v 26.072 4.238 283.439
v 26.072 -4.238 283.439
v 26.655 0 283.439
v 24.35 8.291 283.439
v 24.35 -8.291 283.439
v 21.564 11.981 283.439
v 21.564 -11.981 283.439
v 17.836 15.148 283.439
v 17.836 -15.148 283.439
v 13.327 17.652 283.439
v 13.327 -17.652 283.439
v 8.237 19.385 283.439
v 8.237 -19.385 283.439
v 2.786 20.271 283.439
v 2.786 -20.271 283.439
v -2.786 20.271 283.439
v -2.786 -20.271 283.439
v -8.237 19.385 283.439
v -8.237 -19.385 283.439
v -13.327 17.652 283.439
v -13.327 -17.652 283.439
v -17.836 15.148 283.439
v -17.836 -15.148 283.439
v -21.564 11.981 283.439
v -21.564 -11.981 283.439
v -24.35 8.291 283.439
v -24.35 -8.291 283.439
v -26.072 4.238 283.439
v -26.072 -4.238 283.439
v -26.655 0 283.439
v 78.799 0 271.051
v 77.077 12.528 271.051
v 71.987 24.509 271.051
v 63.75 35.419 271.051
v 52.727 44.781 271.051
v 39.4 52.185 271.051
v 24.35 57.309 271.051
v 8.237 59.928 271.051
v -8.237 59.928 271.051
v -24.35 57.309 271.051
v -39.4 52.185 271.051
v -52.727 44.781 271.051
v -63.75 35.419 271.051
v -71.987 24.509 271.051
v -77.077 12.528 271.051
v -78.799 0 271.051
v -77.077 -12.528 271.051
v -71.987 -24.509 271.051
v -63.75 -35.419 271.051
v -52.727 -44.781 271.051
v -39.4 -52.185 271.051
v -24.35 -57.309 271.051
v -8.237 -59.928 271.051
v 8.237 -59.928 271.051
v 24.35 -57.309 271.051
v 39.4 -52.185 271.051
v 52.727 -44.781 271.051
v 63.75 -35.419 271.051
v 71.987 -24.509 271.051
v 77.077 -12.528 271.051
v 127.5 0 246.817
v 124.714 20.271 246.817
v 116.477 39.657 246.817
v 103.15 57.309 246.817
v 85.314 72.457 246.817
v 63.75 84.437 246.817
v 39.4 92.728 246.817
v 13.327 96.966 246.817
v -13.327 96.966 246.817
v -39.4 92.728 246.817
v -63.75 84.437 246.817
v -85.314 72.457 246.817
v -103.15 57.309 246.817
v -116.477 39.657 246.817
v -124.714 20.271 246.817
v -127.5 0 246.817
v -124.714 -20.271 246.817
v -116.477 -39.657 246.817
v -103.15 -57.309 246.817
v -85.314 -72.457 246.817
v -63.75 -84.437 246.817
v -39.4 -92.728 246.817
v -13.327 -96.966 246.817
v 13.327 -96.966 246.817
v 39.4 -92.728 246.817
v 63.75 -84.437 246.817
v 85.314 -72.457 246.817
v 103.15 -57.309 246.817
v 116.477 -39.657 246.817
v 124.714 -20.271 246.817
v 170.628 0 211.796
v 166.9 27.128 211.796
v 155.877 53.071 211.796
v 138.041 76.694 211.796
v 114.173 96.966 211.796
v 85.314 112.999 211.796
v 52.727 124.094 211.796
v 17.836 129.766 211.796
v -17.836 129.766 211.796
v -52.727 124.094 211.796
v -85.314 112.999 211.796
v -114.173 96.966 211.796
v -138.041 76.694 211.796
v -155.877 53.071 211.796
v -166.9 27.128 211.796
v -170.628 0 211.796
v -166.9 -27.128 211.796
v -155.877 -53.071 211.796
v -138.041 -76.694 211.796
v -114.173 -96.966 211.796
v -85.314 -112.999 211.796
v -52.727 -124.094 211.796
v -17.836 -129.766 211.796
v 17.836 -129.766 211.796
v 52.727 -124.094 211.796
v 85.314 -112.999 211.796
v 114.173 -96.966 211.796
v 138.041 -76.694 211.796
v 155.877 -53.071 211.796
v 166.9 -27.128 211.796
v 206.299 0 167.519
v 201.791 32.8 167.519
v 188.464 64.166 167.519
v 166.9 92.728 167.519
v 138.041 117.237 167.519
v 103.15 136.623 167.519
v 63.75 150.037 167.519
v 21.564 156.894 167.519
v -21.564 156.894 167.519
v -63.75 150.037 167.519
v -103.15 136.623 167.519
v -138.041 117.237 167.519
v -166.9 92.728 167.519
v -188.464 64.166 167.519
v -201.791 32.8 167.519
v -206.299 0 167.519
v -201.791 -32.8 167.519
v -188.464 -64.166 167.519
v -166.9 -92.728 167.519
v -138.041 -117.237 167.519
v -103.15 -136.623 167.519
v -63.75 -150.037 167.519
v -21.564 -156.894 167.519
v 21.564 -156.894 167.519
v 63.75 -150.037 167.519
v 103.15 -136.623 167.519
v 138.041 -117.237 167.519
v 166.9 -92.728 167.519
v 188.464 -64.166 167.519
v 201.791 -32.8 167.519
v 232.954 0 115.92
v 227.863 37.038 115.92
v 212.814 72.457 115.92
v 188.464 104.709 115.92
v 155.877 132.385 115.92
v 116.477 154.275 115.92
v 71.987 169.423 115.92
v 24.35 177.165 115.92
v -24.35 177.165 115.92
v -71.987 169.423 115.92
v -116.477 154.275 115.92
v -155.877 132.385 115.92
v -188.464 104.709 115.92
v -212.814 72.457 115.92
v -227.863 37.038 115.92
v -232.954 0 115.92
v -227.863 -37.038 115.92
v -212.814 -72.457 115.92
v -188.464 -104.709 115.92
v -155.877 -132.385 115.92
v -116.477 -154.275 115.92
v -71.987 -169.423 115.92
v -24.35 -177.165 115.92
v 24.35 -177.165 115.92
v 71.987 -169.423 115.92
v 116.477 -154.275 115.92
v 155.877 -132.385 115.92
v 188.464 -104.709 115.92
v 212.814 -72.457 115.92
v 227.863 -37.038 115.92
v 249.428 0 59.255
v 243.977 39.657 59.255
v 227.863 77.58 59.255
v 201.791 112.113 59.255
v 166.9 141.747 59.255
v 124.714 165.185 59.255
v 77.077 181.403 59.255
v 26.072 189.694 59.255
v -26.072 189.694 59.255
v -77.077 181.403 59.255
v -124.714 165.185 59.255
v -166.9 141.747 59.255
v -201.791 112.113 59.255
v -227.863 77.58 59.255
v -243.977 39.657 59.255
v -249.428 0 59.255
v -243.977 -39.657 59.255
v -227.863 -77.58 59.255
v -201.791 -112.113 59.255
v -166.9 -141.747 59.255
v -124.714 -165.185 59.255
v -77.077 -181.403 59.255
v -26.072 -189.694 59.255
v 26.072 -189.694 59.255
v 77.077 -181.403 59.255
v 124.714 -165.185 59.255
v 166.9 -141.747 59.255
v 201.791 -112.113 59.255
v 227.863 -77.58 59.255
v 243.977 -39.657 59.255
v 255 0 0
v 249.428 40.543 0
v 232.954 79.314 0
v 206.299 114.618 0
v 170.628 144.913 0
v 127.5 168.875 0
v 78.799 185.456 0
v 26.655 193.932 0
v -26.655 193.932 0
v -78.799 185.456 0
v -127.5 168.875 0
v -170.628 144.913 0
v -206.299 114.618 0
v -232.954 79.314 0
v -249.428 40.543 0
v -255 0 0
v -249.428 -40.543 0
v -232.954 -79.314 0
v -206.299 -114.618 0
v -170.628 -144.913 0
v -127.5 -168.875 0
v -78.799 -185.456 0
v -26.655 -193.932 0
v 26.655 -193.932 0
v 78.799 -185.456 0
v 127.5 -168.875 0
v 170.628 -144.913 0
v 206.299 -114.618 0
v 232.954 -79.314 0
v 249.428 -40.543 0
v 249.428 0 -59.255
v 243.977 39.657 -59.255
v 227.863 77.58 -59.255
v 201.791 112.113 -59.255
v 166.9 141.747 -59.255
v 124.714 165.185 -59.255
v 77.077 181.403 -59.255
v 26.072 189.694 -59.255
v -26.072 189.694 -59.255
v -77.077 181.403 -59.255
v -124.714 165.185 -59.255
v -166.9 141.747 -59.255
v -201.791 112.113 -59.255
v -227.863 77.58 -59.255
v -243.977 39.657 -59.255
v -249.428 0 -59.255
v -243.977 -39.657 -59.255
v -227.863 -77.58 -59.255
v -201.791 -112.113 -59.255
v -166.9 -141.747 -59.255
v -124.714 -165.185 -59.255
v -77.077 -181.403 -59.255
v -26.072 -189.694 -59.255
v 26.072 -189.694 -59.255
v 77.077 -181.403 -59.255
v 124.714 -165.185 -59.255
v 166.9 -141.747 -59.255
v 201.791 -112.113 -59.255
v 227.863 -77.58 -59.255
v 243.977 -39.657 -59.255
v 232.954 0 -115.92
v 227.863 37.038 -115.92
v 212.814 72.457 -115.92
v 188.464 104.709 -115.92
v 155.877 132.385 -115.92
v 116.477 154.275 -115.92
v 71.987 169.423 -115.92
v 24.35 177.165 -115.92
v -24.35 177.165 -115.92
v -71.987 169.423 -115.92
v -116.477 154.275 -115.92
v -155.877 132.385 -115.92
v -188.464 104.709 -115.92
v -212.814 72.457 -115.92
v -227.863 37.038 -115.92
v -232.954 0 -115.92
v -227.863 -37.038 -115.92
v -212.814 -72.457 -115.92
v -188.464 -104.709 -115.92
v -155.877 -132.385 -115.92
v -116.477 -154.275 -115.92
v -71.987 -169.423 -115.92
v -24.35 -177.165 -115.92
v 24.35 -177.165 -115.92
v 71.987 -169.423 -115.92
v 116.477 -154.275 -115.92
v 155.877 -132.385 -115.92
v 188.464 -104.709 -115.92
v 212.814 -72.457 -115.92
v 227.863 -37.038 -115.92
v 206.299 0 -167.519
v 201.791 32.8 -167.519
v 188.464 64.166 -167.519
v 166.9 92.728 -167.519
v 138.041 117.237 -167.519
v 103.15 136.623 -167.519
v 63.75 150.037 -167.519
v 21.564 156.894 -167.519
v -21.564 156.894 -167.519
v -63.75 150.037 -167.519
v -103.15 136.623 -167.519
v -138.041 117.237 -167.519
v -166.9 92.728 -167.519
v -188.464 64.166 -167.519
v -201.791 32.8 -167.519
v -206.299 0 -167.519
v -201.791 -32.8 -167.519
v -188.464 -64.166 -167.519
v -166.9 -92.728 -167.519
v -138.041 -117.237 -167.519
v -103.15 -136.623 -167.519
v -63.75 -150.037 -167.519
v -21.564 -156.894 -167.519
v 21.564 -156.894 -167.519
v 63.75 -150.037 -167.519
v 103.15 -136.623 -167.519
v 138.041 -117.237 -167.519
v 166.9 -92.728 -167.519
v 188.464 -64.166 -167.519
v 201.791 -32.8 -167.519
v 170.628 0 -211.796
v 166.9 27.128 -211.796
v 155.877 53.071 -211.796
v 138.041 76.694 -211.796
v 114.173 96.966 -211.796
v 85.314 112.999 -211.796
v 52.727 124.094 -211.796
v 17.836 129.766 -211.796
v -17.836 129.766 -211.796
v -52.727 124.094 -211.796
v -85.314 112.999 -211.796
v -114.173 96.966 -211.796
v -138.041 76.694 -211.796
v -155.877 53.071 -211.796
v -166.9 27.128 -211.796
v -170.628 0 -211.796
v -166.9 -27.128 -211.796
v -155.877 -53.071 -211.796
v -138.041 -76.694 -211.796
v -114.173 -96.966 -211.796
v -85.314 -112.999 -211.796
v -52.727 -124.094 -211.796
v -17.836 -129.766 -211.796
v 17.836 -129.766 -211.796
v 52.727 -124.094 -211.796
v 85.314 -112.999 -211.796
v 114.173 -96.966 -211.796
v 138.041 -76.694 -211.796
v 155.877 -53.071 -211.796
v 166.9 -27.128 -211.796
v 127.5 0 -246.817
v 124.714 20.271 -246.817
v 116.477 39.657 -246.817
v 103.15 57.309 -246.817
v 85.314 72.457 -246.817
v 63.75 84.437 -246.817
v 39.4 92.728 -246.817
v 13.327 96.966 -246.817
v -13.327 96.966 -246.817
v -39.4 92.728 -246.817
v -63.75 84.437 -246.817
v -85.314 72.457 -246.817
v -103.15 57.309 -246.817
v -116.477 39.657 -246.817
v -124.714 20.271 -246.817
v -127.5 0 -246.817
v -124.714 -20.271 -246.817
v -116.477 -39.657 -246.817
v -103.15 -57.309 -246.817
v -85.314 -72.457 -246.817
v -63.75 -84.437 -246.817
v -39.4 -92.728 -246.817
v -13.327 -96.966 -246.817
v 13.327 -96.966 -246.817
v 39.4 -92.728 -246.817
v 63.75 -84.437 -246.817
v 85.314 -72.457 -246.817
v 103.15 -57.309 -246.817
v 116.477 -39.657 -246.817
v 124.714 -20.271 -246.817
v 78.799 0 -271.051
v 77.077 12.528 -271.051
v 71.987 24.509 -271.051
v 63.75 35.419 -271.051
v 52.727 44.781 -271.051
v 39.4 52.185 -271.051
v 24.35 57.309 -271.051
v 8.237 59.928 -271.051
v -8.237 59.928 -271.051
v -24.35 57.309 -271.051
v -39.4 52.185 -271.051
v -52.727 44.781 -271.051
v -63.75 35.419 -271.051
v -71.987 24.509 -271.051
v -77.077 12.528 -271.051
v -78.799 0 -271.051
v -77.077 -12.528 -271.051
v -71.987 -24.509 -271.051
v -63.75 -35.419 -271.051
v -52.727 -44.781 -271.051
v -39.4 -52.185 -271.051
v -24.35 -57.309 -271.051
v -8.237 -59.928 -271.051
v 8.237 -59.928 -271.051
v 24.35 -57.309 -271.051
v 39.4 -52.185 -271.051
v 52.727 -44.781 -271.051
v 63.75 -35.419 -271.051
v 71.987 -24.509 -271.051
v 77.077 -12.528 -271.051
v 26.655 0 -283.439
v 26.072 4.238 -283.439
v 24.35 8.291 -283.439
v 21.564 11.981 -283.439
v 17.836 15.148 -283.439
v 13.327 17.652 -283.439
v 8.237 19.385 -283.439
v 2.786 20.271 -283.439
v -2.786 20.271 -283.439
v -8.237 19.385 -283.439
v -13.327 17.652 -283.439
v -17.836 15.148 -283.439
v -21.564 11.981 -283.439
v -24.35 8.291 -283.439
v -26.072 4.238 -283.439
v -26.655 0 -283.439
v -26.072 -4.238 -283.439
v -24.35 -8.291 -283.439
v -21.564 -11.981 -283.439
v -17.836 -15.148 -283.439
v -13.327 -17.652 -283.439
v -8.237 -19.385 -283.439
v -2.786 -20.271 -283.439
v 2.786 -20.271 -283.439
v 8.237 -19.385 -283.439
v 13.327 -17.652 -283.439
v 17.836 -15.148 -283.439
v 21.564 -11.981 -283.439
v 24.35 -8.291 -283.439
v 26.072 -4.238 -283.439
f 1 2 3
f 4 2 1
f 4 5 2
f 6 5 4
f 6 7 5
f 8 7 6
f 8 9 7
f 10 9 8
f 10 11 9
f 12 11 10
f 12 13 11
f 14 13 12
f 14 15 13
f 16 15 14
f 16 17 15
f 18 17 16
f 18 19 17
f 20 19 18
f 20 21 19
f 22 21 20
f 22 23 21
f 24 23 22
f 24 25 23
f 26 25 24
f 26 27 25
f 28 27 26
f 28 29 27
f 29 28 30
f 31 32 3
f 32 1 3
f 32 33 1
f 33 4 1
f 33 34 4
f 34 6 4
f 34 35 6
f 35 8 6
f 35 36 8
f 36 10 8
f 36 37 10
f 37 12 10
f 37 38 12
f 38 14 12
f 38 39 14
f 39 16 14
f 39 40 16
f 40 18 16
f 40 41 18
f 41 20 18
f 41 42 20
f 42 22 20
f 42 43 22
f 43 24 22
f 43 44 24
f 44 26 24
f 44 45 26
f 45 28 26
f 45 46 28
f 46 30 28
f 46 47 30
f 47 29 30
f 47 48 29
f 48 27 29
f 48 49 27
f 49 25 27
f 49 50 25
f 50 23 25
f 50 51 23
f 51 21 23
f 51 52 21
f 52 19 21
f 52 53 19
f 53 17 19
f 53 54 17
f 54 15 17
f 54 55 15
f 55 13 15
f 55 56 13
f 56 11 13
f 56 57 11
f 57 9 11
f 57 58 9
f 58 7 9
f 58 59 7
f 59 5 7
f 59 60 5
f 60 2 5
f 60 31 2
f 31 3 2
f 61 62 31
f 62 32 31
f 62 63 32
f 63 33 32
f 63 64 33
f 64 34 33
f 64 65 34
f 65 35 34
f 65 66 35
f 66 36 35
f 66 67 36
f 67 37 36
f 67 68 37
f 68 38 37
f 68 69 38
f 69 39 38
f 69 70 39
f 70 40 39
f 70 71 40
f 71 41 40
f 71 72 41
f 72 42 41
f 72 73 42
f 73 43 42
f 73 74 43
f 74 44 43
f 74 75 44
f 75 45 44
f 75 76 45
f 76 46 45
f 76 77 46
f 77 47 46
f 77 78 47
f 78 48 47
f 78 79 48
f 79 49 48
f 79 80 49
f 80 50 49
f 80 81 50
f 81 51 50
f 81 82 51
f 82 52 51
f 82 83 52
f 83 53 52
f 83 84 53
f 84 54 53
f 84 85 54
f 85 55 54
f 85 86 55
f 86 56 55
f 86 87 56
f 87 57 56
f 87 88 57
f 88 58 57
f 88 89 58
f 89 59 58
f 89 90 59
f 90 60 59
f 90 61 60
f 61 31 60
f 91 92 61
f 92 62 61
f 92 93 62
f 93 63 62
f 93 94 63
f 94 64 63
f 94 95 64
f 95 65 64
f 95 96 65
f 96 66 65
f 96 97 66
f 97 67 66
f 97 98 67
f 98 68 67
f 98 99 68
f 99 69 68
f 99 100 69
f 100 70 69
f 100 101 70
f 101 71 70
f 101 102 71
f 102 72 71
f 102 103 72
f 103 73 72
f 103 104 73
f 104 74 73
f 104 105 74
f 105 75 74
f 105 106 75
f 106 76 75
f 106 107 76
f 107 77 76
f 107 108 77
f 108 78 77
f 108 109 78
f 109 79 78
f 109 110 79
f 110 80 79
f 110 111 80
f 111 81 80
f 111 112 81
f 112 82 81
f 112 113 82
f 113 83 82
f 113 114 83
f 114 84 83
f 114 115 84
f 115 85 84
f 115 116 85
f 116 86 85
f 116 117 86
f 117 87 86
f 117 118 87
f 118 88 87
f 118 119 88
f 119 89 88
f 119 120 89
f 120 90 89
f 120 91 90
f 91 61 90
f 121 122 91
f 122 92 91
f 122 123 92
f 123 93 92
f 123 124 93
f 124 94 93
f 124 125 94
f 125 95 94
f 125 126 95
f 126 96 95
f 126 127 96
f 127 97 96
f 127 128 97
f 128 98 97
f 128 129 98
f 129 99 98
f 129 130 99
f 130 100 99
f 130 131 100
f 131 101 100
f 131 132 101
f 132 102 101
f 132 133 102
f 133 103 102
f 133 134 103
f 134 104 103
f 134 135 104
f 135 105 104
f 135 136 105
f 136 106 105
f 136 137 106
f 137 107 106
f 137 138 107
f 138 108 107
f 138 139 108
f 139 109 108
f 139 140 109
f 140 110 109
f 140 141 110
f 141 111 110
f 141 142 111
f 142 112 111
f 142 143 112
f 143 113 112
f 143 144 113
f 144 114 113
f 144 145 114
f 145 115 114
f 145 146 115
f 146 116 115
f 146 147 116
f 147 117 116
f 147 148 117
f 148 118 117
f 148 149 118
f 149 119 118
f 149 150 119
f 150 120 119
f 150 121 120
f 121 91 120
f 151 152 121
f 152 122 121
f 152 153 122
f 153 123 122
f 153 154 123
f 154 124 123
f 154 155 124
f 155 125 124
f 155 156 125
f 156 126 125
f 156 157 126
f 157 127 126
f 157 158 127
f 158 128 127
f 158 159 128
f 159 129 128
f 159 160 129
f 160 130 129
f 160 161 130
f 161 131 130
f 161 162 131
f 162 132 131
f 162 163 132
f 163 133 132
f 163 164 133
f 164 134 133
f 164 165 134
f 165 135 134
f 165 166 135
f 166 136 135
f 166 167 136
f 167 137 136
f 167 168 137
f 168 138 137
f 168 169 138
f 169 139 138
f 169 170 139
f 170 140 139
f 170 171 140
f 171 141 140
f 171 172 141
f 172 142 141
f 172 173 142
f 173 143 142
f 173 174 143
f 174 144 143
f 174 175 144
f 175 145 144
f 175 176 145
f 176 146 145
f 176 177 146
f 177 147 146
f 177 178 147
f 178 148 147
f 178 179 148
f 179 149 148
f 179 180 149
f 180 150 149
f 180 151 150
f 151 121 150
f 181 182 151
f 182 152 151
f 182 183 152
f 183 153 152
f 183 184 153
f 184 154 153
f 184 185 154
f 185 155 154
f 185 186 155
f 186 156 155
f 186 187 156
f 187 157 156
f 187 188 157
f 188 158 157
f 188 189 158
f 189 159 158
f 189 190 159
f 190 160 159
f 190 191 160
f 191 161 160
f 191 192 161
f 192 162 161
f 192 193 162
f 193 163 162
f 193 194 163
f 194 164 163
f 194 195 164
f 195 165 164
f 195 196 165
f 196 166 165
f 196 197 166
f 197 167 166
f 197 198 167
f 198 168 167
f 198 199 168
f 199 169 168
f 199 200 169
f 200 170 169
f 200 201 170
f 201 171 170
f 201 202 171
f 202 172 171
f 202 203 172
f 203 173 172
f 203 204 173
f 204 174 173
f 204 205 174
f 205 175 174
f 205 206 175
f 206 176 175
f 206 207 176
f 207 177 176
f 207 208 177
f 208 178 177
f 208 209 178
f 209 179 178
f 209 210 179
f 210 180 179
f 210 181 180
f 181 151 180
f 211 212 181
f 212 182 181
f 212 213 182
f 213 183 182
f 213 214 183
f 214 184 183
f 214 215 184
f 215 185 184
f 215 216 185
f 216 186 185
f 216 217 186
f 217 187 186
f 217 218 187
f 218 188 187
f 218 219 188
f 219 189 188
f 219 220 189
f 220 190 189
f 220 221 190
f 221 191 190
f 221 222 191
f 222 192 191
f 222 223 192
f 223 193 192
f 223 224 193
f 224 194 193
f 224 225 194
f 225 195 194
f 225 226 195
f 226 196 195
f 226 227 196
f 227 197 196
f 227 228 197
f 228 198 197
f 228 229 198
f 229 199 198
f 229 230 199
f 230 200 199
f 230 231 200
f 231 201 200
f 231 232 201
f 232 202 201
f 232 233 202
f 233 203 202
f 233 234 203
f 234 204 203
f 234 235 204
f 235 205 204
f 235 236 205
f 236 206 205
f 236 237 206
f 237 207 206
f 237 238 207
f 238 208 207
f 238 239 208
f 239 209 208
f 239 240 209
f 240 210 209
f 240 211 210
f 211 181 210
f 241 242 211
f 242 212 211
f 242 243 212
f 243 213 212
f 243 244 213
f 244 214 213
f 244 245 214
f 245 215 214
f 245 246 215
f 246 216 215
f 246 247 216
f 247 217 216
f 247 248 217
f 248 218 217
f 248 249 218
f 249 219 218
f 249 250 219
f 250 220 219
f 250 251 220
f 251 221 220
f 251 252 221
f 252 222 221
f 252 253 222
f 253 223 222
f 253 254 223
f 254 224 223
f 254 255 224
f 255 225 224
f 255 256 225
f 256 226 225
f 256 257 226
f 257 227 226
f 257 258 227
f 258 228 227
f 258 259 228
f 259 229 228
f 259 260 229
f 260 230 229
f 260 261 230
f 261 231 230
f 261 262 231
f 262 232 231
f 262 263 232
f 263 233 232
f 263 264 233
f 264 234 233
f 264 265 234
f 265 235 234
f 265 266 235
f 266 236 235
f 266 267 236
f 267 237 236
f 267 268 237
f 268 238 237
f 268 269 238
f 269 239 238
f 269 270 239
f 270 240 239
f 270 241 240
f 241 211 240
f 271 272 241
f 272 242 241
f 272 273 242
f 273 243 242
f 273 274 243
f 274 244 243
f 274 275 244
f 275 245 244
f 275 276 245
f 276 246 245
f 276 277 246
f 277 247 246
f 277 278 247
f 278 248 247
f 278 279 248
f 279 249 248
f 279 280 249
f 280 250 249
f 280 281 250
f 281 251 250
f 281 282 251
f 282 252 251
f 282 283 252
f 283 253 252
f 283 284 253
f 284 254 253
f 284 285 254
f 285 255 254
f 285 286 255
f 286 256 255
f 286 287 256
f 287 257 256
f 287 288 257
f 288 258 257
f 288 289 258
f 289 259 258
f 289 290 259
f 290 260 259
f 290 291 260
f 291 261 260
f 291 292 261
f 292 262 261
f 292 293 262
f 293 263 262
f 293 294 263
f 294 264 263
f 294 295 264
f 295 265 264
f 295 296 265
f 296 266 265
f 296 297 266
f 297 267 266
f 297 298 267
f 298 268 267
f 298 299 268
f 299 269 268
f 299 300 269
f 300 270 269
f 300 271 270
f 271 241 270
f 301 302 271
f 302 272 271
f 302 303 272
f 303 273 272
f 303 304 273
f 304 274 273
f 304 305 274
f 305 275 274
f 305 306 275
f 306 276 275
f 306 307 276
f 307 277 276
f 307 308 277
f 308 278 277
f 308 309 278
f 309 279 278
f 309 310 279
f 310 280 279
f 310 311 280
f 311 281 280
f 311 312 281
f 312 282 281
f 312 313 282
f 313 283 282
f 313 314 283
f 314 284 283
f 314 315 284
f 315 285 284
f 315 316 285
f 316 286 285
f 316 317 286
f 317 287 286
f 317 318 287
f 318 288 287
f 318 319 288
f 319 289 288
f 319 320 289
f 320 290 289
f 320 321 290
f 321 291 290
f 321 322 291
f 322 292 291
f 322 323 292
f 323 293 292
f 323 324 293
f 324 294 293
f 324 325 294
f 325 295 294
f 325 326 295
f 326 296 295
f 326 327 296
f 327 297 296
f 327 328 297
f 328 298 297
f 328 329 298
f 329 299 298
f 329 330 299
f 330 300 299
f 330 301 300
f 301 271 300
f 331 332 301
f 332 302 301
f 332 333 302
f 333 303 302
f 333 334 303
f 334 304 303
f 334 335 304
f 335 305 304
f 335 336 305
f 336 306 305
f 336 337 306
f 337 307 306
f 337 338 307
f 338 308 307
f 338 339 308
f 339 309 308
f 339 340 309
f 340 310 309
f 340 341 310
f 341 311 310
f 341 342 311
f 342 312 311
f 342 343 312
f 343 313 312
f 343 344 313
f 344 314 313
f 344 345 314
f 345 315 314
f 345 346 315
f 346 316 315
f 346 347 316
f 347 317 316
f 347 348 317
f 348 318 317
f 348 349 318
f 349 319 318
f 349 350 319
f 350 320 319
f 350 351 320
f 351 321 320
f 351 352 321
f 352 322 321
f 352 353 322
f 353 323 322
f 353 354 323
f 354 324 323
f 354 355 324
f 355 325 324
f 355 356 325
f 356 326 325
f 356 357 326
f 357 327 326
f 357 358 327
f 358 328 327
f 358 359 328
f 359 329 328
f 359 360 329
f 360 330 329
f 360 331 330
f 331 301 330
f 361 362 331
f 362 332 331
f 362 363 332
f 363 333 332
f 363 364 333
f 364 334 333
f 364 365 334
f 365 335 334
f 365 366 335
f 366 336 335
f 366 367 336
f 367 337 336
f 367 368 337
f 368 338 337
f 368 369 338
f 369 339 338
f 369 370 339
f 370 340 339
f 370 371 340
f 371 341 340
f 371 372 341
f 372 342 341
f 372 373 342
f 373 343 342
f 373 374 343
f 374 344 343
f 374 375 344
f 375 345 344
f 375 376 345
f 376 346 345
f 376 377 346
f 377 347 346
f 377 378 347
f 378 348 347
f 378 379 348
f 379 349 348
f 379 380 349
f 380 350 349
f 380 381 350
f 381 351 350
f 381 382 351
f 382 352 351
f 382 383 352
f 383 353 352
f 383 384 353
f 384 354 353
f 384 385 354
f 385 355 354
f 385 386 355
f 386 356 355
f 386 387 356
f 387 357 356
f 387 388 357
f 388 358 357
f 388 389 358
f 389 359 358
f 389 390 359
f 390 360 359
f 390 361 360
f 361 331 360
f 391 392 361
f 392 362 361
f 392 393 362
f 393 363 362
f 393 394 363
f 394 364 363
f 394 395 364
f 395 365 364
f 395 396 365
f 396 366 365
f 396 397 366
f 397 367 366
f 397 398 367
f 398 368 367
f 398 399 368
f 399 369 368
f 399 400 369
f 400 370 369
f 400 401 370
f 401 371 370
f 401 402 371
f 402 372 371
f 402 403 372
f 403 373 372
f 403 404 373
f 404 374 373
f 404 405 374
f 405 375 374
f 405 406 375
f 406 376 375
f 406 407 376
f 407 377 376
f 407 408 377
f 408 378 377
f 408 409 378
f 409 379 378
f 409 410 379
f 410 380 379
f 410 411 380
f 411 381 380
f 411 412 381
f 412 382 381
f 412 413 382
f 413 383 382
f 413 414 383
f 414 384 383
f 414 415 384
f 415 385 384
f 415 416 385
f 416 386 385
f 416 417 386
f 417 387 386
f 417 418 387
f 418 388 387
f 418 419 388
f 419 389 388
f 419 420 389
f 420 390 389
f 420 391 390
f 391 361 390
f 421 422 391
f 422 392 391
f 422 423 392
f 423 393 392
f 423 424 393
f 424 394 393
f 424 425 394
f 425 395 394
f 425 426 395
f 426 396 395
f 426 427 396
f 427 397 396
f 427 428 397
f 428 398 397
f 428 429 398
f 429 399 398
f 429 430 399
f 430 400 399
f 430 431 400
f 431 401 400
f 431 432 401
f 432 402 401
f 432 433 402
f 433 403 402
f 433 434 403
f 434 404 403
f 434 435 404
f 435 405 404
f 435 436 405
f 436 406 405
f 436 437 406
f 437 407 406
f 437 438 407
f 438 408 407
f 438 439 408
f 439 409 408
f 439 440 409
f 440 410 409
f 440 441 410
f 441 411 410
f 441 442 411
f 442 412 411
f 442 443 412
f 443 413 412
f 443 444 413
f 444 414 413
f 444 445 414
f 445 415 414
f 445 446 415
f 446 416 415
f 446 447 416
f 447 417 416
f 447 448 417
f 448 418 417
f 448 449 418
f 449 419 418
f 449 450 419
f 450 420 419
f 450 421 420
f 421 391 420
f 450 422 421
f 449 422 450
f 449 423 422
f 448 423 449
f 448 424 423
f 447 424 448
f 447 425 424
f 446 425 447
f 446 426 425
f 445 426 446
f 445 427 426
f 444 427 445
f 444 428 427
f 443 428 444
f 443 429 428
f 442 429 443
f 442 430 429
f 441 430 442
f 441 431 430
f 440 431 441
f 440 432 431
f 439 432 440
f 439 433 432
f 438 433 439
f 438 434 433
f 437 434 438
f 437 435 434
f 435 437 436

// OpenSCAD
// Generated by SolidPython 1.0.1 on 2020-07-29 00:46:53


scale(v = [17, 13, 19]) {
	sphere(r = 15);
}
/***********************************************
*********      SolidPython code:      **********
************************************************
 
# import packages: SolidPython
from solid import *
from solid.utils import *
from itertools import chain, combinations, permutations


class Resize:

    def __init__(self, scad_file):
        self.scad_file = scad_file
        #self.scad_file = import_scad(scad_file)
        # cone/cylinder param:
        self.r1 = 0
        self.r2 = 0
        self.h = 0
        # rectangular prism param:
        self.w = 0
        self.l = 0
        # ellipse param:
        self.r = 0

    # import OpenScad code (file name corresponds to shape)


    # classify shape + parameters
    def assign(self, param1, param2, param3):
        if self.scad_file == 'cone.scad':
            self.r1 = param1
            self.r2 = param2
            self.h = param3
        elif self.scad_file == 'cylinder.scad':
            self.r1 = param1
            self.r2 = param2
            self.h = param3
        elif self.scad_file == 'rectangularPrism.scad':
            self.h = param1
            self.l = param2
            self.w = param3
        else:
            self.r = param1
            self.h = param2

    # resize parameters
    def iterate(self):
        x = range(3, 20, 2)
        i = 1
        if self.scad_file == 'cone.scad':
            tempList = list(permutations(x, 2))
            for temp in tempList:
                param1 = temp[0]
                param2 = temp[1]
                filepath = 'produced_scad_files/' + 'cone' + str(param1) + '_' + str(param2) + '_' + '.scad'
                scad_render_to_file(cylinder(h=param1, r1=param2, r2=0), filepath)

        elif self.scad_file == 'cylinder.scad':
            tempList = list(permutations(x, 3))
            for temp in tempList:
                param1 = temp[0]
                param2 = temp[1]
                filepath = 'produced_scad_files/' + 'cylinder' + str(param1) + '_' + str(param2) + '_' + '.scad'
                scad_render_to_file(cylinder(h=param1, r1=param2, r2=param2), filepath)

        elif self.scad_file == 'rectangularPrism.scad':
            tempList = list(permutations(x, 3))
            for temp in tempList:
                param1 = temp[0]
                param2 = temp[1]
                param3 = temp[2]
                filepath = 'produced_scad_files/' + 'rectangularPrism' + str(param1) + '_' + str(param2) + '_' + str(
                    param3) + '.scad'
                scad_render_to_file(cube(size=(param1, param2, param3)), filepath)

        elif self.scad_file == 'ellipse.scad':
            tempList = list(permutations(x, 4))
            for temp in tempList:
                param1 = temp[0]
                param2 = temp[1]
                param3 = temp[2]
                param4 = temp[3]
                filepath = 'produced_scad_files/' + 'ellipse' + str(param1) + '_' + str(param2) + '_' + str(param3) + '_' + str(param4) + '.scad'
                scad_render_to_file(scale([param1, param2, param3])(sphere(r=param4)), filepath)

    def render_to_scadfile(self):
        scad_render_to_file(scad, 'example.scad') 
 
************************************************/
